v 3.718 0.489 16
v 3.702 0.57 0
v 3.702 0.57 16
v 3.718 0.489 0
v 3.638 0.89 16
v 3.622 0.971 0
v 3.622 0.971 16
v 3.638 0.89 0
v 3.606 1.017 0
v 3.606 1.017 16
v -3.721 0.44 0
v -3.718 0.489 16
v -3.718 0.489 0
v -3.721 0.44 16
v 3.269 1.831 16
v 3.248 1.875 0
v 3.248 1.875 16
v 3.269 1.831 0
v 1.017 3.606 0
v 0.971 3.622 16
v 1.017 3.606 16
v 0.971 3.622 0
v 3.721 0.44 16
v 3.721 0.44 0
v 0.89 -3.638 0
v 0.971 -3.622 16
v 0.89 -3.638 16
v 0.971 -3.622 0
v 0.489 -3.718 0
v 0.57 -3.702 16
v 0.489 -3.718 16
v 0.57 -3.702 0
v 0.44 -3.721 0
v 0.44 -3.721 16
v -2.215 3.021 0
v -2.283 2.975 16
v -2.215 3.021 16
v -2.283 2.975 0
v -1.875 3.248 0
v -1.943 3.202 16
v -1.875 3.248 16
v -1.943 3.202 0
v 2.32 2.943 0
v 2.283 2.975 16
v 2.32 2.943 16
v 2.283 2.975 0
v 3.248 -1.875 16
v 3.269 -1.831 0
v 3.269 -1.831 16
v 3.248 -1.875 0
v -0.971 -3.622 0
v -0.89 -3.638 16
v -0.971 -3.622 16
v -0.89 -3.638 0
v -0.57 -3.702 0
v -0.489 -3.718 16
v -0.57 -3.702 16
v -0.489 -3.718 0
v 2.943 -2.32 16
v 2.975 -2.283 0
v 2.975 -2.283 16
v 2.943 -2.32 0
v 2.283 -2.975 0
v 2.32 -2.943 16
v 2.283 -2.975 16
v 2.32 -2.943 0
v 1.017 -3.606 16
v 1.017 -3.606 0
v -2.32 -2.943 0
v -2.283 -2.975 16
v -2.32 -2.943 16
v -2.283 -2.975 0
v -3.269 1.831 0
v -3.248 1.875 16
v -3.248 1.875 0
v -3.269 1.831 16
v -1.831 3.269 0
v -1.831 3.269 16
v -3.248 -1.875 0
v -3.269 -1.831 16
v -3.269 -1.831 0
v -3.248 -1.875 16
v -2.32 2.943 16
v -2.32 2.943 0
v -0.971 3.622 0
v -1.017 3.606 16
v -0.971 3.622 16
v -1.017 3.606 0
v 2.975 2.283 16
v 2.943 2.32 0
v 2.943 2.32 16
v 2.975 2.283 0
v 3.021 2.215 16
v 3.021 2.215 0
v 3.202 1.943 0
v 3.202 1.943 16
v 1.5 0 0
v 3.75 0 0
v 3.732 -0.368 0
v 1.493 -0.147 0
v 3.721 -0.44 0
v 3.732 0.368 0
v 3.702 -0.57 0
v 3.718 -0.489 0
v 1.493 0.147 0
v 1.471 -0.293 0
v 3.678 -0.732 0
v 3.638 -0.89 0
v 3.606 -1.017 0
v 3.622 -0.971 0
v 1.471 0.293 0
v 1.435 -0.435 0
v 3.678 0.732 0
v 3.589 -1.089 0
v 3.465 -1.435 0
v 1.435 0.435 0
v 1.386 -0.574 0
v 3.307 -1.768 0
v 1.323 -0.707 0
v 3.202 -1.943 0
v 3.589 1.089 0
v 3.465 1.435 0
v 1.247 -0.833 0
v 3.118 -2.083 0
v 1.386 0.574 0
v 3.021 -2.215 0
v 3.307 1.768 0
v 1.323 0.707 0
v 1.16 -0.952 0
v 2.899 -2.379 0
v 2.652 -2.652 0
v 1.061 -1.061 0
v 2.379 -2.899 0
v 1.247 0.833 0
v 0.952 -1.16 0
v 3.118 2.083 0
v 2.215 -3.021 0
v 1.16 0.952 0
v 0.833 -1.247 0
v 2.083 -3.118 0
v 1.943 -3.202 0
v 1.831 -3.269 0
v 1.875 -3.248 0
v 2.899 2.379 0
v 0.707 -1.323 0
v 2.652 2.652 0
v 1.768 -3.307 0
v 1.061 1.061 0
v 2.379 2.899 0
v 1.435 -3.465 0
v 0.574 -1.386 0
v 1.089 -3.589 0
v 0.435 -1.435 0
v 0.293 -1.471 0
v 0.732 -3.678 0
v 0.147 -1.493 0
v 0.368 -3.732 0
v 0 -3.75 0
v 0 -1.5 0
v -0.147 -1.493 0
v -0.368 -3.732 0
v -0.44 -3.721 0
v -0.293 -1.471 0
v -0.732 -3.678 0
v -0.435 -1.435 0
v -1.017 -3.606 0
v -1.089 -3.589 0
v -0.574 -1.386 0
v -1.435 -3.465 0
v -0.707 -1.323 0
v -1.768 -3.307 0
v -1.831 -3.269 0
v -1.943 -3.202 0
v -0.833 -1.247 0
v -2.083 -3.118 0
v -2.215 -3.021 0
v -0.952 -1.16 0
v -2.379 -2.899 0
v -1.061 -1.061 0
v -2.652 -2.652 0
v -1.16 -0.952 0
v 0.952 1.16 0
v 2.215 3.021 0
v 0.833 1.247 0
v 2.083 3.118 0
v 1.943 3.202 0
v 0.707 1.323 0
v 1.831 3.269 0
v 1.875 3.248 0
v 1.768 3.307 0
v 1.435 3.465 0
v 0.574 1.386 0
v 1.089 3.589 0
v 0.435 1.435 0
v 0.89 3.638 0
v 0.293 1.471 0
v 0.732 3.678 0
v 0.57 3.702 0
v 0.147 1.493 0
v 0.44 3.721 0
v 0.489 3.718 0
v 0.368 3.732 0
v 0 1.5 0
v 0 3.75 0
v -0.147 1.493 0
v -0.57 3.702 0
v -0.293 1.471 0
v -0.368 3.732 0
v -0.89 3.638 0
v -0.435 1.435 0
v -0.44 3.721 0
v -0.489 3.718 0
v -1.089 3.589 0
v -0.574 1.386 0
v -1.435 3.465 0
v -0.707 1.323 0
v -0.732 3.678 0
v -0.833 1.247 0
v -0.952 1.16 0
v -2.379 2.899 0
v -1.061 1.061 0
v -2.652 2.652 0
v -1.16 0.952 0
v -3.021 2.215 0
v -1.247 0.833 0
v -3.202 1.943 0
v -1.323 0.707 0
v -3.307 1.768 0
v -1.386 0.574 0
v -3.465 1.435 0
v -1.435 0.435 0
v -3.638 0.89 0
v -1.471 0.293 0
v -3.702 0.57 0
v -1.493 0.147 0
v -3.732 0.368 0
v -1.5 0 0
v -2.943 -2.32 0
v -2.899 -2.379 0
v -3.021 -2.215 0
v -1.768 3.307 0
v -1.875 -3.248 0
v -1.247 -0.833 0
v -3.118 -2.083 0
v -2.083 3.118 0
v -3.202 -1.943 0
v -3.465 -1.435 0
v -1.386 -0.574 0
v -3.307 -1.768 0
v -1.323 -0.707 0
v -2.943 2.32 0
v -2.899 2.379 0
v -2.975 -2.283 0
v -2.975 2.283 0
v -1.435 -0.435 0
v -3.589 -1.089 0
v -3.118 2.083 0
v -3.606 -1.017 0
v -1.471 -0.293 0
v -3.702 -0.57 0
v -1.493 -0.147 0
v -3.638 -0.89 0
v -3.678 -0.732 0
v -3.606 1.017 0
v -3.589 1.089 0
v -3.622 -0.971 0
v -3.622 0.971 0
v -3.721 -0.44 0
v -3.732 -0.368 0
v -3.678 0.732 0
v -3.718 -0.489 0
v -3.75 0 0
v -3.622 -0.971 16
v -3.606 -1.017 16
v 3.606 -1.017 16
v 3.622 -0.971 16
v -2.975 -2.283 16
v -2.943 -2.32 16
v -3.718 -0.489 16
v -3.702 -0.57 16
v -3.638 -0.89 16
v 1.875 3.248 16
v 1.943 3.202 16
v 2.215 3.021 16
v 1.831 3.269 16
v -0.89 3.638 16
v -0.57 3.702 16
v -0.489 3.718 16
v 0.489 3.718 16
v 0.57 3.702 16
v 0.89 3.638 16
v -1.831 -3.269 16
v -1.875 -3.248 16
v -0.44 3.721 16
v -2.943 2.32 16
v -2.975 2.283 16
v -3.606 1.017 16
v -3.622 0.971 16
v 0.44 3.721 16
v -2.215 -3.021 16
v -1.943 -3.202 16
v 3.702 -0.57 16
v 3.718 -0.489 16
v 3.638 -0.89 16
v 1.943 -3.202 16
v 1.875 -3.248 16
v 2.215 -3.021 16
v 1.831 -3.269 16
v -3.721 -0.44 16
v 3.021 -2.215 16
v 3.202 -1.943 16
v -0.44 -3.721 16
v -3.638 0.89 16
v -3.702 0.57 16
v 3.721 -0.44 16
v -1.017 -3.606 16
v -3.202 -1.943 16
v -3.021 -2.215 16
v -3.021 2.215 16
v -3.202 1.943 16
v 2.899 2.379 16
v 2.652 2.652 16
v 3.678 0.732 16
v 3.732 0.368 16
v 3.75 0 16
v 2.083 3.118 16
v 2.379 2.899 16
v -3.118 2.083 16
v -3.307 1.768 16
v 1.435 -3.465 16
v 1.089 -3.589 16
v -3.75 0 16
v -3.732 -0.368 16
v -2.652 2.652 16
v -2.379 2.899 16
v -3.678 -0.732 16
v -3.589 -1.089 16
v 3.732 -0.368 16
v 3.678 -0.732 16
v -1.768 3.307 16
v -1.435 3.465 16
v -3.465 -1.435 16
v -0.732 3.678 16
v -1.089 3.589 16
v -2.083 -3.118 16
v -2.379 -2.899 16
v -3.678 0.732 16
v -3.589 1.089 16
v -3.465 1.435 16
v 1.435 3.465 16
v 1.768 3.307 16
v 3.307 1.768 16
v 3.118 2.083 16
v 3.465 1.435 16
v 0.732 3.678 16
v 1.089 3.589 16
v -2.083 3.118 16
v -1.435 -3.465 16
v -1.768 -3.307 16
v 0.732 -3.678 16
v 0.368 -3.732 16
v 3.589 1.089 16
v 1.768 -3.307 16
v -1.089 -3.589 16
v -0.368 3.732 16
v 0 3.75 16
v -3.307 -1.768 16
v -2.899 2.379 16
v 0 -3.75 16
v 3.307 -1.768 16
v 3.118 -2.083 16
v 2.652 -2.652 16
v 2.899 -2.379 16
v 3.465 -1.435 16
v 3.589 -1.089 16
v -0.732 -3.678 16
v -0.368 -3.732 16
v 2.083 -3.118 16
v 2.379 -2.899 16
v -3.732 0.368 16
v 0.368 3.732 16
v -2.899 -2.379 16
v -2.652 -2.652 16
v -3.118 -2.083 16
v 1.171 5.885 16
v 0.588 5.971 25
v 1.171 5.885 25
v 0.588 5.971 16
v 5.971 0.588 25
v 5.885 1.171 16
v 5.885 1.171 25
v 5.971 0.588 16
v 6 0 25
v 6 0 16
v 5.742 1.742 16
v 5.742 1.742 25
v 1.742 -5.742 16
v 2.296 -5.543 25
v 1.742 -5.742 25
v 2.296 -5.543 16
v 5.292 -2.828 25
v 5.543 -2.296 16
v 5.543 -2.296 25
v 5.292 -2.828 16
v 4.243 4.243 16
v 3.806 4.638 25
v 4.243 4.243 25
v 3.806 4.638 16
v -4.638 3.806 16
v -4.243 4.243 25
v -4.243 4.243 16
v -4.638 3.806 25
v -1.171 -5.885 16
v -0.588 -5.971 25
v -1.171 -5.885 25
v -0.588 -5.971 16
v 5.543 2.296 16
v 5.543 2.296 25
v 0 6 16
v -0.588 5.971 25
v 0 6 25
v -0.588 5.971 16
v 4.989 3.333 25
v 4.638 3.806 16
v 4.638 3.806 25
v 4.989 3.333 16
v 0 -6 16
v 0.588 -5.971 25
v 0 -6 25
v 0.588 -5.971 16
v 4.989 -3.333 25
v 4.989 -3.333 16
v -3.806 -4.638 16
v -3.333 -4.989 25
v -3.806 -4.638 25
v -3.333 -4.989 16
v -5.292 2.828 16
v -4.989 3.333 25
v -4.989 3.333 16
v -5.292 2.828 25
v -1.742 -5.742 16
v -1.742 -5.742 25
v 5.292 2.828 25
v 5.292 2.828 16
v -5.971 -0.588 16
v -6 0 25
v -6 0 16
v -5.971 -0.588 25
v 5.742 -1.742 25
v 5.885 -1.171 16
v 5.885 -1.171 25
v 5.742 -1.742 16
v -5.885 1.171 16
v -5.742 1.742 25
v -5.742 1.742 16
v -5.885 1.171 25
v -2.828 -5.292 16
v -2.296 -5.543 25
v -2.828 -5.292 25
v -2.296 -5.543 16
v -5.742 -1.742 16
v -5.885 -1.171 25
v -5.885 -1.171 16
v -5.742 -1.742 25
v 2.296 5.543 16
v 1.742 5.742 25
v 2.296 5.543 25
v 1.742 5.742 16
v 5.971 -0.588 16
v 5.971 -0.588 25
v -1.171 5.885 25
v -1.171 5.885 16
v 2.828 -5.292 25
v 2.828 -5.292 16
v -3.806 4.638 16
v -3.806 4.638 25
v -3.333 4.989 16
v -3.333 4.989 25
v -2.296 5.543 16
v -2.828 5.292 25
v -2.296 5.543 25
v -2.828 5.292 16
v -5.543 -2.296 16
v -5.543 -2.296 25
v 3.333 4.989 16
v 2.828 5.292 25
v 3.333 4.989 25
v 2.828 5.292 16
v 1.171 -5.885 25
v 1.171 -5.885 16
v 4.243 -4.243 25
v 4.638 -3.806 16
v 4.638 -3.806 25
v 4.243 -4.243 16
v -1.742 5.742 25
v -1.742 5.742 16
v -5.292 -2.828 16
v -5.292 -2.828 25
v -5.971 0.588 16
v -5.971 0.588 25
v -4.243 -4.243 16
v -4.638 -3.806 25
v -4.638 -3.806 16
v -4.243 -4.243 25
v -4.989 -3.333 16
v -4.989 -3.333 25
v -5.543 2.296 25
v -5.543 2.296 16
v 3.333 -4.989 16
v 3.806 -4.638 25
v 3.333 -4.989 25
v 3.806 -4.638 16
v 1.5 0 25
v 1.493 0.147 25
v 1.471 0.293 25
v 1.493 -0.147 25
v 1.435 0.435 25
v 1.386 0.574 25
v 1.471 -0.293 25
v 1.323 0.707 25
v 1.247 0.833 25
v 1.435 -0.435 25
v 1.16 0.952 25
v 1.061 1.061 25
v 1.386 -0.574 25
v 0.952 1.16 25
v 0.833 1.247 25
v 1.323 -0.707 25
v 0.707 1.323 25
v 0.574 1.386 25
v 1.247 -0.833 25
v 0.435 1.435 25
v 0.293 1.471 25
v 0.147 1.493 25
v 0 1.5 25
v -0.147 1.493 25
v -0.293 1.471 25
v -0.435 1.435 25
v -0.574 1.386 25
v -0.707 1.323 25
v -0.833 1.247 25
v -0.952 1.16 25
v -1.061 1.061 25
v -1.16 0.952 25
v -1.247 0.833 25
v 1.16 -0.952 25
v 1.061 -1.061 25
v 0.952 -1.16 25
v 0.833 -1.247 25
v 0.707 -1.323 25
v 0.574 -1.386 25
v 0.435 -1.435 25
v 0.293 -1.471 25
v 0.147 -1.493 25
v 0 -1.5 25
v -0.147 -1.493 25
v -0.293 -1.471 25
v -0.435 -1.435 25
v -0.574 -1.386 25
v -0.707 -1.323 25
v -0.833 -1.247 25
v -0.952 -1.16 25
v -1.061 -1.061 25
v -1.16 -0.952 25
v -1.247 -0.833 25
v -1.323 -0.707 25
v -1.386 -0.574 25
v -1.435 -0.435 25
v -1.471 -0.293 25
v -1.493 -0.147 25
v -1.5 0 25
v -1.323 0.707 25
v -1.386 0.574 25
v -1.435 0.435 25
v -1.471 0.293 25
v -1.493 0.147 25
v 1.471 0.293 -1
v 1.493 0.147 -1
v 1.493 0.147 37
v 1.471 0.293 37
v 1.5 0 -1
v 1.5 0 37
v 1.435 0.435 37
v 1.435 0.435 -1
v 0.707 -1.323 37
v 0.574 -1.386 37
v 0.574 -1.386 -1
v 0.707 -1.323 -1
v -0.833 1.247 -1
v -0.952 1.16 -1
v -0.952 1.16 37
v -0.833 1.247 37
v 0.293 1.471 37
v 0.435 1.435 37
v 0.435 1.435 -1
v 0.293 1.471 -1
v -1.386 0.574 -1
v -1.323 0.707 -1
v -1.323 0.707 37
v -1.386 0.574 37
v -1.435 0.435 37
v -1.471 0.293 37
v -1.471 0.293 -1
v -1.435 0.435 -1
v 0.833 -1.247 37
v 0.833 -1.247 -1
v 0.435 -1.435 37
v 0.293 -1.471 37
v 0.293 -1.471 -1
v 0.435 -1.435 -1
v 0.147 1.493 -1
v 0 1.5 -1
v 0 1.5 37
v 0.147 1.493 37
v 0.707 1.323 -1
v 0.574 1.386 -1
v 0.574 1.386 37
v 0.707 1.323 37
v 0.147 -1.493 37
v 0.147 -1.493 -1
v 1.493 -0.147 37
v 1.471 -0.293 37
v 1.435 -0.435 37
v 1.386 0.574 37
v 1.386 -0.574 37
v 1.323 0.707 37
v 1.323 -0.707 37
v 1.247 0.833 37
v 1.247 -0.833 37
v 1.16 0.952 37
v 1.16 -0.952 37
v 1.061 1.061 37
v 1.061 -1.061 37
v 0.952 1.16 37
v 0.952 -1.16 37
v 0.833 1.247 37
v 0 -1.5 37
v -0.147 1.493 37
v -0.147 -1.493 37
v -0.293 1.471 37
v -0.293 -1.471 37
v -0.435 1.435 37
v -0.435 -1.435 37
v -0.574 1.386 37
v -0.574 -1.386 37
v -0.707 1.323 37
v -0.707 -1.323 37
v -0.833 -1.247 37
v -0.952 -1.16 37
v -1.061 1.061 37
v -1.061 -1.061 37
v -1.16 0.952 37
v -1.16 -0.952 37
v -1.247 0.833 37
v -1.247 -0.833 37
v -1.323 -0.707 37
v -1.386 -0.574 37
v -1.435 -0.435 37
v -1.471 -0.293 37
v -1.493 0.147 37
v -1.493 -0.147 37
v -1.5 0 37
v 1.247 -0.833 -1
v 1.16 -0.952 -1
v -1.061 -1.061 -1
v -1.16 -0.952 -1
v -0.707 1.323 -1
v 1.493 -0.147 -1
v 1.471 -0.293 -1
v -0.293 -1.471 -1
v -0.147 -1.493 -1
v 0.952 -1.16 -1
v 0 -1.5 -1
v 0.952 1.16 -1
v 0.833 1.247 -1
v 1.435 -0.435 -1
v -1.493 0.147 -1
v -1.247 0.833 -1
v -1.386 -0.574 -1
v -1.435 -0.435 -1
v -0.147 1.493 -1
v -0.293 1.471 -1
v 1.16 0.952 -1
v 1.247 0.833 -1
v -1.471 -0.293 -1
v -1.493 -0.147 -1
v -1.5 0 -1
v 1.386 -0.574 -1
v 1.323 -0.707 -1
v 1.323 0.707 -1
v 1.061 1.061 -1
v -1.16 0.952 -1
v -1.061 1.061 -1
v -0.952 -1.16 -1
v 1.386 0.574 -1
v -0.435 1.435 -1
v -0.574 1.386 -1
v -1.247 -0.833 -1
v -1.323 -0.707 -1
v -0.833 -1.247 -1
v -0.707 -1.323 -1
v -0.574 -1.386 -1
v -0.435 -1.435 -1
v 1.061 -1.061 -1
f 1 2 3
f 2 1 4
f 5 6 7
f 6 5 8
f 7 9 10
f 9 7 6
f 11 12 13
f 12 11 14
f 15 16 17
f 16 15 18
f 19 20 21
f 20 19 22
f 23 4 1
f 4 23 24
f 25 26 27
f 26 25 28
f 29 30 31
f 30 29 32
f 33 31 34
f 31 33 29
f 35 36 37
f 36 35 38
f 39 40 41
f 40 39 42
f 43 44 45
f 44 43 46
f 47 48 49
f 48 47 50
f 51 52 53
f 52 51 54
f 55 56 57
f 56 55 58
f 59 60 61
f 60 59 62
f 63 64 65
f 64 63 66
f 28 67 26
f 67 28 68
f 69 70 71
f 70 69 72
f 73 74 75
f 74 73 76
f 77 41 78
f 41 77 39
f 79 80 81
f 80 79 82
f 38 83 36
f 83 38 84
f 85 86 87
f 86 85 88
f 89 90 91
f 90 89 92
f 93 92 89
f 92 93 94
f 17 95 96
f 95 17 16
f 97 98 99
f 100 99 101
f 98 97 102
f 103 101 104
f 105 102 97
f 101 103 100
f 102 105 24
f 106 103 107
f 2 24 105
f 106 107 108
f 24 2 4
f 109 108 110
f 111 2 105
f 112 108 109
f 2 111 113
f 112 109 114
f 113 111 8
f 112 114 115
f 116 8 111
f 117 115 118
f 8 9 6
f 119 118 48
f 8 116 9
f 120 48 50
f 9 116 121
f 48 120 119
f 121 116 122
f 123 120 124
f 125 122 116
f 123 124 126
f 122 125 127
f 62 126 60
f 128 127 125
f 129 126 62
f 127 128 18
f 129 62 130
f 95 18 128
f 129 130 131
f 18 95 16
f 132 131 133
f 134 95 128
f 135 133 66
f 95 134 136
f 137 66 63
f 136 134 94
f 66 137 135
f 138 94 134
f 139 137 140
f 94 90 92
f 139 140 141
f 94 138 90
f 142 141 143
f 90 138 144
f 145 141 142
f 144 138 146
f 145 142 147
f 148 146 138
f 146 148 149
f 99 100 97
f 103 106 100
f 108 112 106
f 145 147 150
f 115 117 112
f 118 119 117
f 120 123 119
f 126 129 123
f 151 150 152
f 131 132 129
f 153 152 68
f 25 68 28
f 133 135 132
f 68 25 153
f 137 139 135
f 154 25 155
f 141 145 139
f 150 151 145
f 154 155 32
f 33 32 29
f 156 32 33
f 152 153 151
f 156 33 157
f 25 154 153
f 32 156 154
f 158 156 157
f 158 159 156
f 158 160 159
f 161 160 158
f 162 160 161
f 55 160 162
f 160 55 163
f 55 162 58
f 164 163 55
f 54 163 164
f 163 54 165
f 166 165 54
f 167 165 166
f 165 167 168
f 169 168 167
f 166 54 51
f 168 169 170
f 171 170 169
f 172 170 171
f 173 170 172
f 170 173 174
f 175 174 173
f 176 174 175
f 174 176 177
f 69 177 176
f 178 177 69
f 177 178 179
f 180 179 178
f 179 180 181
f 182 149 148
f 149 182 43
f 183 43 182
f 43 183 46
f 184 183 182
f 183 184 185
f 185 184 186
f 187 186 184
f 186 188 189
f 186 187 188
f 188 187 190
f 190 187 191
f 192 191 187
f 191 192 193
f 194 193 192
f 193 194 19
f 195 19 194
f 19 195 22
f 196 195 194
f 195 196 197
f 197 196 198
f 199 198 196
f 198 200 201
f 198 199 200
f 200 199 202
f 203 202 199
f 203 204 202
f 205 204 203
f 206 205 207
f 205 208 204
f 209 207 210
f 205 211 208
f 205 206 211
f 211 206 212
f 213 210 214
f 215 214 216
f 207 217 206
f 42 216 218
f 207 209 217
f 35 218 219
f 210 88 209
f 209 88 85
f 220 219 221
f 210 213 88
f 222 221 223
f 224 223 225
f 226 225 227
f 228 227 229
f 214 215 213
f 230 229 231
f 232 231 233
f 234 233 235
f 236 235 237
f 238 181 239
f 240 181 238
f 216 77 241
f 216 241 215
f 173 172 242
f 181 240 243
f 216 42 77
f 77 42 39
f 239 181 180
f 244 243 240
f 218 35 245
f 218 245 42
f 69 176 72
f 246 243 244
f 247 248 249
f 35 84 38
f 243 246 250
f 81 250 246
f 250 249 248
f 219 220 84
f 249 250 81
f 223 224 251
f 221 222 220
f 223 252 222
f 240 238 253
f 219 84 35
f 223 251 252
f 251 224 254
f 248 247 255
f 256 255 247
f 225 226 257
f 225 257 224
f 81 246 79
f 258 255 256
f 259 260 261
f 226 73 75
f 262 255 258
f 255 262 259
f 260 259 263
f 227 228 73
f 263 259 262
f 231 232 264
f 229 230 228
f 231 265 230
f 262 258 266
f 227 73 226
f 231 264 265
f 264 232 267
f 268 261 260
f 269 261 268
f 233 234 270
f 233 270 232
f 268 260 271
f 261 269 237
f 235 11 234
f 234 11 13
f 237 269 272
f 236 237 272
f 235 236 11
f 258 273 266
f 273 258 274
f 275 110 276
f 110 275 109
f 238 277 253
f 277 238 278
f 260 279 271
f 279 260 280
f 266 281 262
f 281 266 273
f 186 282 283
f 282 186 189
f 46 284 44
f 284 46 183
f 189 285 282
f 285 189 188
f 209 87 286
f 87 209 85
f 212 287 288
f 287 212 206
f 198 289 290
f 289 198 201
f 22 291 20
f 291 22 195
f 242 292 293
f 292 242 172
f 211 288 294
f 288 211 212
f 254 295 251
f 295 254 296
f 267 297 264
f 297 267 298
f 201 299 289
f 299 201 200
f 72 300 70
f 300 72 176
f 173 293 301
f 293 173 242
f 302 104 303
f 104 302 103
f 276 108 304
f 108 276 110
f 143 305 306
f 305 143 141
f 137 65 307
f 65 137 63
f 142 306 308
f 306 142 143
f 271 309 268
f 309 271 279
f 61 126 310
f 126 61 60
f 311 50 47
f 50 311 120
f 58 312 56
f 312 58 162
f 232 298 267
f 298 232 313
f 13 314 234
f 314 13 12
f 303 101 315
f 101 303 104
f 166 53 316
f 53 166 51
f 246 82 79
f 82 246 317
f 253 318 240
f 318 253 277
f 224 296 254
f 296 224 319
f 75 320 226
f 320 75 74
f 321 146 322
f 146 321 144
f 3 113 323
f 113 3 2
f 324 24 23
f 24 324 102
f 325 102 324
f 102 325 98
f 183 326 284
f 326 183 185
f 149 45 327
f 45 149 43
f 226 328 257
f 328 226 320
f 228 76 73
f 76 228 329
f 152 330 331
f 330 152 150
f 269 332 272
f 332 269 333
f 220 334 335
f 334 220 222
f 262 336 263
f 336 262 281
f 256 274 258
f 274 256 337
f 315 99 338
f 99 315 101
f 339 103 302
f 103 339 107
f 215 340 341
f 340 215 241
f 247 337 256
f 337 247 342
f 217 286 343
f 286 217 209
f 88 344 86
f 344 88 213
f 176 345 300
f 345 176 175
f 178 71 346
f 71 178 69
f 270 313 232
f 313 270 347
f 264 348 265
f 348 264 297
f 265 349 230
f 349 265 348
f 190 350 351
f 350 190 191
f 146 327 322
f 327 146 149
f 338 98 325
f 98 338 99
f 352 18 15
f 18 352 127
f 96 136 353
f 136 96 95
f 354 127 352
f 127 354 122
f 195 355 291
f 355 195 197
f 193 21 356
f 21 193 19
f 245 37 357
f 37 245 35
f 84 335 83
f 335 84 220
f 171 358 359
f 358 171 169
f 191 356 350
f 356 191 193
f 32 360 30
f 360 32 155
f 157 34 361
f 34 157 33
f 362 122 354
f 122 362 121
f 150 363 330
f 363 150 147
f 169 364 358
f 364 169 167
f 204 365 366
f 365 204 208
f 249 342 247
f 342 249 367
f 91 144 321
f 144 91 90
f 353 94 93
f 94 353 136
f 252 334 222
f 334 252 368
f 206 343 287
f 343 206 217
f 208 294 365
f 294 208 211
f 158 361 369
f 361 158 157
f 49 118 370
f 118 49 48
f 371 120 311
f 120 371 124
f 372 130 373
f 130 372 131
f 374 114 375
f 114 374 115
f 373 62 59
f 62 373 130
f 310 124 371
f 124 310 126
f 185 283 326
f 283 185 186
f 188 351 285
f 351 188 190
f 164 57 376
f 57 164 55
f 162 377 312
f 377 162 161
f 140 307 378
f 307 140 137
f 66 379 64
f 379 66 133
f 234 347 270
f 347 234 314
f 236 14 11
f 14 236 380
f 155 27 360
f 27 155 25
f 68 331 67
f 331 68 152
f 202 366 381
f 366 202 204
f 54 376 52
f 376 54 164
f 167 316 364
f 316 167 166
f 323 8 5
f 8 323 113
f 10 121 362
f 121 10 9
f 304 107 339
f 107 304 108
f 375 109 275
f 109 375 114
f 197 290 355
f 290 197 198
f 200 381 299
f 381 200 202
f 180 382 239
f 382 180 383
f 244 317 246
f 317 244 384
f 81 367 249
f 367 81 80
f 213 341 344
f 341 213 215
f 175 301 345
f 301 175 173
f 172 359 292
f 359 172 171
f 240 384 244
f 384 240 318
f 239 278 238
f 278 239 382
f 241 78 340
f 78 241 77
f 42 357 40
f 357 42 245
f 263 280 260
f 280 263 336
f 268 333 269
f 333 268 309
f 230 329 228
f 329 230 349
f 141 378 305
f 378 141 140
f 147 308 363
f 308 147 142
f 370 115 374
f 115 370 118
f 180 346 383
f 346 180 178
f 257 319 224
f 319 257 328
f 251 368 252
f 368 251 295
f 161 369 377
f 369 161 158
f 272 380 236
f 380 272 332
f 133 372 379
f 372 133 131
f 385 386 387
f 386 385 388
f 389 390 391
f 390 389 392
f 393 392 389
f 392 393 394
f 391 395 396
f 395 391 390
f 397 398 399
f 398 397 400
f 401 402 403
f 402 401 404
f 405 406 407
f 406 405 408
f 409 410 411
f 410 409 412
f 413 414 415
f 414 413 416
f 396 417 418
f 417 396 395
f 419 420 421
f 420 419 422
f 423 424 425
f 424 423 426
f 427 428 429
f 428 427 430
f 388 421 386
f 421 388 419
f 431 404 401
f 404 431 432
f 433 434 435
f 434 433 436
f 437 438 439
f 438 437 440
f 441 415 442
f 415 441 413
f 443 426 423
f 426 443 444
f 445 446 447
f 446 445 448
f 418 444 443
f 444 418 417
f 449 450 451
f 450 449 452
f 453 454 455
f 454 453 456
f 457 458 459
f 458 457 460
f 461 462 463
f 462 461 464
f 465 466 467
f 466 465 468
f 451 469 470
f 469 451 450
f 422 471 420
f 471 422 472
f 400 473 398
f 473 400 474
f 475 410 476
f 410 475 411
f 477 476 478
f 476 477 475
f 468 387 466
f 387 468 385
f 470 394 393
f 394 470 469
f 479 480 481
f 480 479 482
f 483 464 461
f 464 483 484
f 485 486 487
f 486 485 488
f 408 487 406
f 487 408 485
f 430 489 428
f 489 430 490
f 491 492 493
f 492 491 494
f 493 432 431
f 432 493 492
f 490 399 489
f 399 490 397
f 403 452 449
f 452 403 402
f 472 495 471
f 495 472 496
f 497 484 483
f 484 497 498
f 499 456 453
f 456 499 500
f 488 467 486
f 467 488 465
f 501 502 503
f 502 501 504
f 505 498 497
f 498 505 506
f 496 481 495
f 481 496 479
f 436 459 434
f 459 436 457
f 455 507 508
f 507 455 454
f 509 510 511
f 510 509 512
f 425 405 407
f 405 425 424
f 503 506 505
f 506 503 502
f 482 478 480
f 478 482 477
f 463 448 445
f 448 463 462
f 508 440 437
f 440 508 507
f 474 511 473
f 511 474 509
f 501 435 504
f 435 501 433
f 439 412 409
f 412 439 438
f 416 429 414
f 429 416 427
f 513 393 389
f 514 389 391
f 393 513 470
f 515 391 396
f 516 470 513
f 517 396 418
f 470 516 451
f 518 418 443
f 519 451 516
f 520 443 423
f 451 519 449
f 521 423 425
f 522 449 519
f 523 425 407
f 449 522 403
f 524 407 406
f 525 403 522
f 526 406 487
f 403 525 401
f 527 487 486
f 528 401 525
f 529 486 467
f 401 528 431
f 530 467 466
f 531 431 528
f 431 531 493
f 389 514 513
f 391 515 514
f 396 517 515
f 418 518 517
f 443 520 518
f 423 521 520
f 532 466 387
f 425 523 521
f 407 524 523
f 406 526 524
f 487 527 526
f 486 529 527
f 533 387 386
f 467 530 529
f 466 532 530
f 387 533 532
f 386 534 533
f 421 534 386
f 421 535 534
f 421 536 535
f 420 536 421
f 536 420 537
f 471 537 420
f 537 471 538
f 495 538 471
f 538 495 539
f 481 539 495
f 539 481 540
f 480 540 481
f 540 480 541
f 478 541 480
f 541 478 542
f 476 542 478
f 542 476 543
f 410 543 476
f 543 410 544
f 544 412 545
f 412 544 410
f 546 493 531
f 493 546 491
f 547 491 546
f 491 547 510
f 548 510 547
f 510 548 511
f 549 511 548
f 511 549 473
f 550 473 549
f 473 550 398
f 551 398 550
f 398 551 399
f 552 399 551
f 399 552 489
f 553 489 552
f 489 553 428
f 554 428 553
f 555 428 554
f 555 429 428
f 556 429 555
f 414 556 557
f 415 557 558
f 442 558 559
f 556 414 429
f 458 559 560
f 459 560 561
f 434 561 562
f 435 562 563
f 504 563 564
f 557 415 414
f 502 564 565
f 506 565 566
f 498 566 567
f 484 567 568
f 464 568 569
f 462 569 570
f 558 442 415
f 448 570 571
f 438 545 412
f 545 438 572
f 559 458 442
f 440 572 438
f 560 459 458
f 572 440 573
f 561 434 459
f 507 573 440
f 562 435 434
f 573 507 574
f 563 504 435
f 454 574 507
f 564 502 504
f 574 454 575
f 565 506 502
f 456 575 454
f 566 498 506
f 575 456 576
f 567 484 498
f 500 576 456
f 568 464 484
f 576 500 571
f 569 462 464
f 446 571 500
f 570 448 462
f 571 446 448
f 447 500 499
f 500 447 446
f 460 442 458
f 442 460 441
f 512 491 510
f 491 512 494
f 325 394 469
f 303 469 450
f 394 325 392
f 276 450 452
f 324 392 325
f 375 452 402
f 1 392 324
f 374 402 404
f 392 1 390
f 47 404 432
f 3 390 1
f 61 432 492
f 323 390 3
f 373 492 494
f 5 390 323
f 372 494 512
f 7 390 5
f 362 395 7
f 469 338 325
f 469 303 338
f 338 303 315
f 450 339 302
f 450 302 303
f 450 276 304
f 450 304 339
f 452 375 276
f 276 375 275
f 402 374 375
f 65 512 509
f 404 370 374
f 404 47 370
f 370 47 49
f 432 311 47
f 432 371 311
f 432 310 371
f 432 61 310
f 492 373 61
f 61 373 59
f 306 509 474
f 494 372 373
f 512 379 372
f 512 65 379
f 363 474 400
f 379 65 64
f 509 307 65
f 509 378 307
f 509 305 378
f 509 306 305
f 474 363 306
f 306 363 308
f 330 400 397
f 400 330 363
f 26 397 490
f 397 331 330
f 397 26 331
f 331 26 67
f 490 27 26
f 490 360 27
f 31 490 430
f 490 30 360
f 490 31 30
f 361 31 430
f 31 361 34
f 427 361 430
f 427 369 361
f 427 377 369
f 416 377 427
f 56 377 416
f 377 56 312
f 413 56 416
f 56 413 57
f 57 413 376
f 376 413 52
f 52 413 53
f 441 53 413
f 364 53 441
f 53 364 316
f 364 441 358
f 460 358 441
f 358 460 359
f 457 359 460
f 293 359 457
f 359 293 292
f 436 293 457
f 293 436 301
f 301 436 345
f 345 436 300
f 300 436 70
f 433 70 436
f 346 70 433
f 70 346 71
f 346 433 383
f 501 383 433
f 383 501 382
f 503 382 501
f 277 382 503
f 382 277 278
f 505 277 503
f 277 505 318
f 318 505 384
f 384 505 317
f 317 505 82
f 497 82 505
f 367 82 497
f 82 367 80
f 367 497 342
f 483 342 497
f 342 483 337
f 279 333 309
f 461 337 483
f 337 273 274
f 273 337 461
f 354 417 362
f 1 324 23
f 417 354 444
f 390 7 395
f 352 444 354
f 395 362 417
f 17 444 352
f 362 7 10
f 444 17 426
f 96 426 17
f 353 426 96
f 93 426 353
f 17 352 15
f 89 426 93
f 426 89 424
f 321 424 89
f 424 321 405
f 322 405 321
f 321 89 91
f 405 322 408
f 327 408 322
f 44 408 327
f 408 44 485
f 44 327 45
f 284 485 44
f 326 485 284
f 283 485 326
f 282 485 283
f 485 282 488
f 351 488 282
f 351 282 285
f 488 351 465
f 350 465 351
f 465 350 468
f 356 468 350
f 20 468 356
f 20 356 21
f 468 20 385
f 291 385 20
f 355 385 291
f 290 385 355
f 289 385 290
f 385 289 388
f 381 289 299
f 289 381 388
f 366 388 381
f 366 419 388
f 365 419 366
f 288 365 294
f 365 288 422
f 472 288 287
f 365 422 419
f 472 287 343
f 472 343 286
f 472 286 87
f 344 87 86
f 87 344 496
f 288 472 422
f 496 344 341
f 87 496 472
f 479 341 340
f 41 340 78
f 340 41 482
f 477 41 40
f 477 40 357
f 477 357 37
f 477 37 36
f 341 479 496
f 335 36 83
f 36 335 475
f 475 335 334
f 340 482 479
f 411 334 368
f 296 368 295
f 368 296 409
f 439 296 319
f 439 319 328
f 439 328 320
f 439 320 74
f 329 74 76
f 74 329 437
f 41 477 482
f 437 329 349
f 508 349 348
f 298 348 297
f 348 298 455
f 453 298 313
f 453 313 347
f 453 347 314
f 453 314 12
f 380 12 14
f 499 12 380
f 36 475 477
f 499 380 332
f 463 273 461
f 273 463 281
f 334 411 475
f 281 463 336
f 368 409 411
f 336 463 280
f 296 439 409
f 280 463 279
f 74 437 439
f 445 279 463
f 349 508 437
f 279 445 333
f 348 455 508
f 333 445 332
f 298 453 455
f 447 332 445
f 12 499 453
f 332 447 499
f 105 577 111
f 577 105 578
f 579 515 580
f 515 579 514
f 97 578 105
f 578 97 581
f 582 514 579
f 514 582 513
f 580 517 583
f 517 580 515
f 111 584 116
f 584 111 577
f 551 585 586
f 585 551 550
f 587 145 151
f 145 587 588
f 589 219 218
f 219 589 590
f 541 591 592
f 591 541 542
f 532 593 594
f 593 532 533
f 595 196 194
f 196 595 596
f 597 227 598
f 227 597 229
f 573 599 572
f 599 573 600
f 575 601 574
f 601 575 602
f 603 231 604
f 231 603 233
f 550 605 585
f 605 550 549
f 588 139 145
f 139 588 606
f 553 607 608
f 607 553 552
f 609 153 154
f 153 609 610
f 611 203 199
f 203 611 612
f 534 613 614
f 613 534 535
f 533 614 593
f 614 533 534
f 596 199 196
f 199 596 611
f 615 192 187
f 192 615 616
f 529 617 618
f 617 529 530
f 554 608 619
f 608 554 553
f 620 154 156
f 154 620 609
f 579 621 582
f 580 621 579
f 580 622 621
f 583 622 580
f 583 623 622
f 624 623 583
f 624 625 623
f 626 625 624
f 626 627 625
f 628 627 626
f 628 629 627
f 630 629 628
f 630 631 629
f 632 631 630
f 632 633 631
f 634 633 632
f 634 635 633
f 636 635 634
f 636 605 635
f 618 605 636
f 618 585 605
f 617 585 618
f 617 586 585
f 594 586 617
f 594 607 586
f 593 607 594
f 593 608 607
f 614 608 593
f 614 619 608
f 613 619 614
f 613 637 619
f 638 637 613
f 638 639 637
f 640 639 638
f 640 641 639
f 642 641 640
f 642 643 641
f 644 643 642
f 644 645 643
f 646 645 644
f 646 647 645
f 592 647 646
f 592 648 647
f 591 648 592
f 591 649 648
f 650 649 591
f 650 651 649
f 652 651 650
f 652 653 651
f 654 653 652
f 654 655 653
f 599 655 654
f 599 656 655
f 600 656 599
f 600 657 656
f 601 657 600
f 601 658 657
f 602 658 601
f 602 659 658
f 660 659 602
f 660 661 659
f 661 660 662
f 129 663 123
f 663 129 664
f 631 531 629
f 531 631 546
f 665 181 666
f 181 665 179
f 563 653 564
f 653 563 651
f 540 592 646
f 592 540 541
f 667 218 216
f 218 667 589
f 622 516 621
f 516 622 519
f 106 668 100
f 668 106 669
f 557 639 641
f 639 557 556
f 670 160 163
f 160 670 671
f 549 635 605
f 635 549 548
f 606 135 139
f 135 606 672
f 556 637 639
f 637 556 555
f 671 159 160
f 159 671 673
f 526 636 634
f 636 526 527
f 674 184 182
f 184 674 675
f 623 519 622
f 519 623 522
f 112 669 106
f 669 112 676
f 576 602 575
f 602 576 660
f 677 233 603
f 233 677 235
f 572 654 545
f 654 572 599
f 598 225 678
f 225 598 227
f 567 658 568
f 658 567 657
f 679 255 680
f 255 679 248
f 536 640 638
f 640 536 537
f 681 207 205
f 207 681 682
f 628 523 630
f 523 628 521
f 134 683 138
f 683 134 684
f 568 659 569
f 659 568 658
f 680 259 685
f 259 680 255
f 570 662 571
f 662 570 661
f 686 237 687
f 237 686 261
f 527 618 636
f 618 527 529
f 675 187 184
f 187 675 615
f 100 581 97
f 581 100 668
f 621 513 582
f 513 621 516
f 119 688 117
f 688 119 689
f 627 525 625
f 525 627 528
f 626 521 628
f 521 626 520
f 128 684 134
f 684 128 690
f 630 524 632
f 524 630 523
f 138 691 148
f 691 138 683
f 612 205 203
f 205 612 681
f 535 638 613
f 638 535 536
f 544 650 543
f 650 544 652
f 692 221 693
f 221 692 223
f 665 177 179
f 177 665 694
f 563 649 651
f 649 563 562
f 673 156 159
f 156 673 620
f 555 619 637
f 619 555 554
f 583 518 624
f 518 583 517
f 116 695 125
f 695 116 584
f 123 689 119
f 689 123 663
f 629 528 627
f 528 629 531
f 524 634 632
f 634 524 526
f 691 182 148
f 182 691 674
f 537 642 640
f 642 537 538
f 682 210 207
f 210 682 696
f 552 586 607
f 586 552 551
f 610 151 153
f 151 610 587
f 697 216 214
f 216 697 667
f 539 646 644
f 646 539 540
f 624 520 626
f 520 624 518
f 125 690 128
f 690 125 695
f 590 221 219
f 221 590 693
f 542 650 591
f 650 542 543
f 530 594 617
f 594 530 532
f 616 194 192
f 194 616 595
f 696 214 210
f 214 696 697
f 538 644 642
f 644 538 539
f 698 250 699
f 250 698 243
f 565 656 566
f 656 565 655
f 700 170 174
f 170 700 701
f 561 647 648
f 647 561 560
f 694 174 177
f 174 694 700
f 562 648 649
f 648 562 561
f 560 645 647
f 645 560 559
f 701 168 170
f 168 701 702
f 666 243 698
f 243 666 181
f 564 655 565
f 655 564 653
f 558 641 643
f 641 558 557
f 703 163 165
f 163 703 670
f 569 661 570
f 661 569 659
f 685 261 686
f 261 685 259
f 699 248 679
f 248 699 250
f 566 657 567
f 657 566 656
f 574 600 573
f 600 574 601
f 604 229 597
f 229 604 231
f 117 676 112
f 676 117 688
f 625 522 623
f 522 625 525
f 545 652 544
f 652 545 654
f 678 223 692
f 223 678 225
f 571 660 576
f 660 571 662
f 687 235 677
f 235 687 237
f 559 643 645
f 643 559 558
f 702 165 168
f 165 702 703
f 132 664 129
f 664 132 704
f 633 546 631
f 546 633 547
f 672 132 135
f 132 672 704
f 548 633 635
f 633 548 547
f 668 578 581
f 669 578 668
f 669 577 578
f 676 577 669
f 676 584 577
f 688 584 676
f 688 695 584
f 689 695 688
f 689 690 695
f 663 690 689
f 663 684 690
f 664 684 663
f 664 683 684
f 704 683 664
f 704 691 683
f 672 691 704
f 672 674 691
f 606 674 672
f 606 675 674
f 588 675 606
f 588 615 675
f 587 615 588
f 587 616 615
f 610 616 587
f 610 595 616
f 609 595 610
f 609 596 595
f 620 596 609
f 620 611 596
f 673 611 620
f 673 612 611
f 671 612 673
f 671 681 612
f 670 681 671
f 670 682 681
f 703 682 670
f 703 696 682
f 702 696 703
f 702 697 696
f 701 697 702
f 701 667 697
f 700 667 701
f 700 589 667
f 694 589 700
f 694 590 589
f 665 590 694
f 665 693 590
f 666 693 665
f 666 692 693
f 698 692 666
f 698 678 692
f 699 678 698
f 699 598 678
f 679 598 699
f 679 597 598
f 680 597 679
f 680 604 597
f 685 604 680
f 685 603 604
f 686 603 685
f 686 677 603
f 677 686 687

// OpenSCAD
// Hose-barb reducer - joins two silicone-tubing sizes with a through bore. The two barbs are
// stacked (one above the other) on each port. NOVEL general part (a generic reducer, not any
// one manufacturer's part).
//

tube1_d = 8;
tube2_d = 5;
bore    = 3;
length1 = 20;
length2 = 41 - 25;
collar  = 12;

$fn = 64;

saw1_base = 7.5;
saw1_top  = 9.5;
saw2_base = 6.5;
saw2_top  = 5.0;

module sawtooth(h, d0, d1) {
    l     = 10;                 // horizontal run of the tooth
    $fn   = 48;
    res   = [d0, d1];
    profile = concat([d0, res[1] - d0, res[1], d1 - res[1], d1]);
    difference() {
        cylinder(h = h, d = d0);
        translate([0, 0, h * 0.25]) rotate([0, 0, 90]) linear_extrude(l = l) polygon(profile);
        translate([0, 0, h * 0.75]) rotate([0, 0, 90]) linear_extrude(l = l) polygon(profile);
    }
}

union() {
    if (length1 > 0)
        cylinder(h = length1, d = saw1_base);
    if (length2 > 0)
        cylinder(h = length2, d = saw2_base);
    translate([0, 0, length1 > 0 ? length1 : 0]) cylinder(h = 5, d = collar);
    translate([0, 0, length2 < length1 ? length2 : length1 - 5]) cylinder(h = 5, d = collar);
    if (length1 > 0)
        for (z = [0, length1 / 2])
            translate([0, 0, z]) sawtooth(h = 10, d0 = saw1_base, d1 = saw1_top);
    if (length2 > 0)
        for (z = [0, length2 / 2])
            translate([0, 0, z]) sawtooth(h = 8, d0 = saw2_base, d1 = saw2_top);
    translate([0, 0, -1]) cylinder(h = length1 + length2 + 2, d = bore);
}
